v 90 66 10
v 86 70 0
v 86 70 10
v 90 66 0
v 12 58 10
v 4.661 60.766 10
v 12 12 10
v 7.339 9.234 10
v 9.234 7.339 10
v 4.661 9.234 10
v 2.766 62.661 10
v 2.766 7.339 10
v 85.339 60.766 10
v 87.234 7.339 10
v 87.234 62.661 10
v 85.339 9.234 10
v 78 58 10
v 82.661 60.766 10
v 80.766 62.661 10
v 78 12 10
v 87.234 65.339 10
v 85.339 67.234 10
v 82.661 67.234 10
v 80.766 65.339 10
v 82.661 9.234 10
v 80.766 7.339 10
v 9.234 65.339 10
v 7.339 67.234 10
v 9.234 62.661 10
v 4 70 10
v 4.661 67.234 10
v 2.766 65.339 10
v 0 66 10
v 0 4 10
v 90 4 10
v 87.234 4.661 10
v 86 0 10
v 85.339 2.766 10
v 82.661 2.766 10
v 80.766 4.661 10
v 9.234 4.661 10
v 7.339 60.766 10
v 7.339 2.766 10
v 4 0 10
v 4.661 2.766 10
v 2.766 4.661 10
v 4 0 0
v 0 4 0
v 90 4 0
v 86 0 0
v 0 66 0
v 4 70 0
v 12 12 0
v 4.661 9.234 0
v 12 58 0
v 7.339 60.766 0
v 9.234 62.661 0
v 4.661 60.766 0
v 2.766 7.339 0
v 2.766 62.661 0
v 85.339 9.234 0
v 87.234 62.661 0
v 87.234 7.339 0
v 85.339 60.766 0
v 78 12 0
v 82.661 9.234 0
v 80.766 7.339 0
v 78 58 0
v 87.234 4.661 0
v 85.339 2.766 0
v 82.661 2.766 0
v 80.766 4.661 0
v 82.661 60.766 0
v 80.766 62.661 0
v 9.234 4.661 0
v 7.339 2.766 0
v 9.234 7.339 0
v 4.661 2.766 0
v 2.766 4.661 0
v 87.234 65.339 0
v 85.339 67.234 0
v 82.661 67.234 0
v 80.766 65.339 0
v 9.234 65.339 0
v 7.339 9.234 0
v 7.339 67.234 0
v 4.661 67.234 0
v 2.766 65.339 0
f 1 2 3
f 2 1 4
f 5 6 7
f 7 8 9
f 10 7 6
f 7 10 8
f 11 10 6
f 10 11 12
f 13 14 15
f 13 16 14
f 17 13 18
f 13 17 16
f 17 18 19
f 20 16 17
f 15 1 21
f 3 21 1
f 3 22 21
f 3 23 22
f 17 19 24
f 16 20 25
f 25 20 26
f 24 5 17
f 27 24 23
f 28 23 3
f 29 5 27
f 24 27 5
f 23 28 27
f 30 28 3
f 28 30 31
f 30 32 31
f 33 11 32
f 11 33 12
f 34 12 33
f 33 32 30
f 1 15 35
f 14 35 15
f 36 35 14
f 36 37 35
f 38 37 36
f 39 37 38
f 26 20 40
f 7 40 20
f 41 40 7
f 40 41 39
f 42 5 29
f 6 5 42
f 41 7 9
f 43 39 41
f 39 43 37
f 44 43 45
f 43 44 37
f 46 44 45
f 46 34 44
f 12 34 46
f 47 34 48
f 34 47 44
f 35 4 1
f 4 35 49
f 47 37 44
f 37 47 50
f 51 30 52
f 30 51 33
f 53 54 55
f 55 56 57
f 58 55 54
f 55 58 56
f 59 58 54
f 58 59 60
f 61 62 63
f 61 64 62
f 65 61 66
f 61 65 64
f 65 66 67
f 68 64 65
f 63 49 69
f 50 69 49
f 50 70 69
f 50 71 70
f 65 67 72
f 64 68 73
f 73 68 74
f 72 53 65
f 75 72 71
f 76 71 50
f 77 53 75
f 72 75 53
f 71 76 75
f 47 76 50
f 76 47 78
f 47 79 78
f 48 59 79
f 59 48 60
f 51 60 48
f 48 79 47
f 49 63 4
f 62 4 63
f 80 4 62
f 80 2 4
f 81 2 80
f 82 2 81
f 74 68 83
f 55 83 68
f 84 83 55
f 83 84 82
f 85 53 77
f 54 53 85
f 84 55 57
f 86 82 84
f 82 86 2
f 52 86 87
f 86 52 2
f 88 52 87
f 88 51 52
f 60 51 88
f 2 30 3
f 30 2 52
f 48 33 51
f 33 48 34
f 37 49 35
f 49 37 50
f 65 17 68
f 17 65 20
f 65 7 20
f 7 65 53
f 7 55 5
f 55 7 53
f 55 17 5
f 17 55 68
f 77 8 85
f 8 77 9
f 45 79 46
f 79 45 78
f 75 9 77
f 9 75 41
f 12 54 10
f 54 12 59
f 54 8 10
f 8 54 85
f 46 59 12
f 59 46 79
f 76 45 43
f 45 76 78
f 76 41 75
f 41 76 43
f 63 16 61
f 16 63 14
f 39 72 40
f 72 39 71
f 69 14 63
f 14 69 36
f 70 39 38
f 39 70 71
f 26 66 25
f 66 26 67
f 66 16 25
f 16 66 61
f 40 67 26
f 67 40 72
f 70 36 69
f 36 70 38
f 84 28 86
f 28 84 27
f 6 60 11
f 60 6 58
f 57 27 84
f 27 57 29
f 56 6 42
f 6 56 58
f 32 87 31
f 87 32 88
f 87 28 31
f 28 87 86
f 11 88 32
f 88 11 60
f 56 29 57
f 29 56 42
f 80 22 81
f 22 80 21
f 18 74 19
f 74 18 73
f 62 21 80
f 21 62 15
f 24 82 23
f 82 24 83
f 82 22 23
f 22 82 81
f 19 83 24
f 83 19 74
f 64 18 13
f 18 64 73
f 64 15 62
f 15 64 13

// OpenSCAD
$fn = 32;

// ----------------------------------------------------------------------
// Frame plate: 90 x 70 frame, 12 mm rails
// ----------------------------------------------------------------------

// --- parameters (mm) ---
plate_l = 90;             // plate length, X
plate_w = 70;             // plate width, Y
plate_t = 10;             // plate thickness, Z (extrusion height)
corner_c = 4;             // corner chamfer
frame_bar = 12;           // frame rail width
bolt_r = 3.5;             // corner bolt window radius
bolt_inset = 6;           // bolt centre inset from the edges

win_l = plate_l - 2 * frame_bar;  // window length
win_w = plate_w - 2 * frame_bar;  // window width
bolt_d = 2 * bolt_r;  // corner hole diameter

profile = [[4, 0], [86, 0], [90, 4], [90, 66], [86, 70], [4, 70], [0, 66], [0, 4]];  // primary outline, 8 points, counter clockwise
void_1 = [[12, 12], [78, 12], [78, 58], [12, 58]];  // the window, 4 points
void_2 = [[9.234, 7.339], [7.339, 9.234], [4.661, 9.234], [2.766, 7.339], [2.766, 4.661], [4.661, 2.766], [7.339, 2.766], [9.234, 4.661]];  // corner bolt window, 8 points
void_3 = [[87.234, 7.339], [85.339, 9.234], [82.661, 9.234], [80.766, 7.339], [80.766, 4.661], [82.661, 2.766], [85.339, 2.766], [87.234, 4.661]];  // corner bolt window, 8 points
void_4 = [[9.234, 65.339], [7.339, 67.234], [4.661, 67.234], [2.766, 65.339], [2.766, 62.661], [4.661, 60.766], [7.339, 60.766], [9.234, 62.661]];  // corner bolt window, 8 points
void_5 = [[87.234, 65.339], [85.339, 67.234], [82.661, 67.234], [80.766, 65.339], [80.766, 62.661], [82.661, 60.766], [85.339, 60.766], [87.234, 62.661]];  // corner bolt window, 8 points

// --- the one profile operation ---
difference() {
  linear_extrude(height = plate_t) polygon(points = profile);
  translate([0, 0, -1])
    linear_extrude(height = plate_t + 2) polygon(points = void_1);
  translate([0, 0, -1])
    linear_extrude(height = plate_t + 2) polygon(points = void_2);
  translate([0, 0, -1])
    linear_extrude(height = plate_t + 2) polygon(points = void_3);
  translate([0, 0, -1])
    linear_extrude(height = plate_t + 2) polygon(points = void_4);
  translate([0, 0, -1])
    linear_extrude(height = plate_t + 2) polygon(points = void_5);
}
